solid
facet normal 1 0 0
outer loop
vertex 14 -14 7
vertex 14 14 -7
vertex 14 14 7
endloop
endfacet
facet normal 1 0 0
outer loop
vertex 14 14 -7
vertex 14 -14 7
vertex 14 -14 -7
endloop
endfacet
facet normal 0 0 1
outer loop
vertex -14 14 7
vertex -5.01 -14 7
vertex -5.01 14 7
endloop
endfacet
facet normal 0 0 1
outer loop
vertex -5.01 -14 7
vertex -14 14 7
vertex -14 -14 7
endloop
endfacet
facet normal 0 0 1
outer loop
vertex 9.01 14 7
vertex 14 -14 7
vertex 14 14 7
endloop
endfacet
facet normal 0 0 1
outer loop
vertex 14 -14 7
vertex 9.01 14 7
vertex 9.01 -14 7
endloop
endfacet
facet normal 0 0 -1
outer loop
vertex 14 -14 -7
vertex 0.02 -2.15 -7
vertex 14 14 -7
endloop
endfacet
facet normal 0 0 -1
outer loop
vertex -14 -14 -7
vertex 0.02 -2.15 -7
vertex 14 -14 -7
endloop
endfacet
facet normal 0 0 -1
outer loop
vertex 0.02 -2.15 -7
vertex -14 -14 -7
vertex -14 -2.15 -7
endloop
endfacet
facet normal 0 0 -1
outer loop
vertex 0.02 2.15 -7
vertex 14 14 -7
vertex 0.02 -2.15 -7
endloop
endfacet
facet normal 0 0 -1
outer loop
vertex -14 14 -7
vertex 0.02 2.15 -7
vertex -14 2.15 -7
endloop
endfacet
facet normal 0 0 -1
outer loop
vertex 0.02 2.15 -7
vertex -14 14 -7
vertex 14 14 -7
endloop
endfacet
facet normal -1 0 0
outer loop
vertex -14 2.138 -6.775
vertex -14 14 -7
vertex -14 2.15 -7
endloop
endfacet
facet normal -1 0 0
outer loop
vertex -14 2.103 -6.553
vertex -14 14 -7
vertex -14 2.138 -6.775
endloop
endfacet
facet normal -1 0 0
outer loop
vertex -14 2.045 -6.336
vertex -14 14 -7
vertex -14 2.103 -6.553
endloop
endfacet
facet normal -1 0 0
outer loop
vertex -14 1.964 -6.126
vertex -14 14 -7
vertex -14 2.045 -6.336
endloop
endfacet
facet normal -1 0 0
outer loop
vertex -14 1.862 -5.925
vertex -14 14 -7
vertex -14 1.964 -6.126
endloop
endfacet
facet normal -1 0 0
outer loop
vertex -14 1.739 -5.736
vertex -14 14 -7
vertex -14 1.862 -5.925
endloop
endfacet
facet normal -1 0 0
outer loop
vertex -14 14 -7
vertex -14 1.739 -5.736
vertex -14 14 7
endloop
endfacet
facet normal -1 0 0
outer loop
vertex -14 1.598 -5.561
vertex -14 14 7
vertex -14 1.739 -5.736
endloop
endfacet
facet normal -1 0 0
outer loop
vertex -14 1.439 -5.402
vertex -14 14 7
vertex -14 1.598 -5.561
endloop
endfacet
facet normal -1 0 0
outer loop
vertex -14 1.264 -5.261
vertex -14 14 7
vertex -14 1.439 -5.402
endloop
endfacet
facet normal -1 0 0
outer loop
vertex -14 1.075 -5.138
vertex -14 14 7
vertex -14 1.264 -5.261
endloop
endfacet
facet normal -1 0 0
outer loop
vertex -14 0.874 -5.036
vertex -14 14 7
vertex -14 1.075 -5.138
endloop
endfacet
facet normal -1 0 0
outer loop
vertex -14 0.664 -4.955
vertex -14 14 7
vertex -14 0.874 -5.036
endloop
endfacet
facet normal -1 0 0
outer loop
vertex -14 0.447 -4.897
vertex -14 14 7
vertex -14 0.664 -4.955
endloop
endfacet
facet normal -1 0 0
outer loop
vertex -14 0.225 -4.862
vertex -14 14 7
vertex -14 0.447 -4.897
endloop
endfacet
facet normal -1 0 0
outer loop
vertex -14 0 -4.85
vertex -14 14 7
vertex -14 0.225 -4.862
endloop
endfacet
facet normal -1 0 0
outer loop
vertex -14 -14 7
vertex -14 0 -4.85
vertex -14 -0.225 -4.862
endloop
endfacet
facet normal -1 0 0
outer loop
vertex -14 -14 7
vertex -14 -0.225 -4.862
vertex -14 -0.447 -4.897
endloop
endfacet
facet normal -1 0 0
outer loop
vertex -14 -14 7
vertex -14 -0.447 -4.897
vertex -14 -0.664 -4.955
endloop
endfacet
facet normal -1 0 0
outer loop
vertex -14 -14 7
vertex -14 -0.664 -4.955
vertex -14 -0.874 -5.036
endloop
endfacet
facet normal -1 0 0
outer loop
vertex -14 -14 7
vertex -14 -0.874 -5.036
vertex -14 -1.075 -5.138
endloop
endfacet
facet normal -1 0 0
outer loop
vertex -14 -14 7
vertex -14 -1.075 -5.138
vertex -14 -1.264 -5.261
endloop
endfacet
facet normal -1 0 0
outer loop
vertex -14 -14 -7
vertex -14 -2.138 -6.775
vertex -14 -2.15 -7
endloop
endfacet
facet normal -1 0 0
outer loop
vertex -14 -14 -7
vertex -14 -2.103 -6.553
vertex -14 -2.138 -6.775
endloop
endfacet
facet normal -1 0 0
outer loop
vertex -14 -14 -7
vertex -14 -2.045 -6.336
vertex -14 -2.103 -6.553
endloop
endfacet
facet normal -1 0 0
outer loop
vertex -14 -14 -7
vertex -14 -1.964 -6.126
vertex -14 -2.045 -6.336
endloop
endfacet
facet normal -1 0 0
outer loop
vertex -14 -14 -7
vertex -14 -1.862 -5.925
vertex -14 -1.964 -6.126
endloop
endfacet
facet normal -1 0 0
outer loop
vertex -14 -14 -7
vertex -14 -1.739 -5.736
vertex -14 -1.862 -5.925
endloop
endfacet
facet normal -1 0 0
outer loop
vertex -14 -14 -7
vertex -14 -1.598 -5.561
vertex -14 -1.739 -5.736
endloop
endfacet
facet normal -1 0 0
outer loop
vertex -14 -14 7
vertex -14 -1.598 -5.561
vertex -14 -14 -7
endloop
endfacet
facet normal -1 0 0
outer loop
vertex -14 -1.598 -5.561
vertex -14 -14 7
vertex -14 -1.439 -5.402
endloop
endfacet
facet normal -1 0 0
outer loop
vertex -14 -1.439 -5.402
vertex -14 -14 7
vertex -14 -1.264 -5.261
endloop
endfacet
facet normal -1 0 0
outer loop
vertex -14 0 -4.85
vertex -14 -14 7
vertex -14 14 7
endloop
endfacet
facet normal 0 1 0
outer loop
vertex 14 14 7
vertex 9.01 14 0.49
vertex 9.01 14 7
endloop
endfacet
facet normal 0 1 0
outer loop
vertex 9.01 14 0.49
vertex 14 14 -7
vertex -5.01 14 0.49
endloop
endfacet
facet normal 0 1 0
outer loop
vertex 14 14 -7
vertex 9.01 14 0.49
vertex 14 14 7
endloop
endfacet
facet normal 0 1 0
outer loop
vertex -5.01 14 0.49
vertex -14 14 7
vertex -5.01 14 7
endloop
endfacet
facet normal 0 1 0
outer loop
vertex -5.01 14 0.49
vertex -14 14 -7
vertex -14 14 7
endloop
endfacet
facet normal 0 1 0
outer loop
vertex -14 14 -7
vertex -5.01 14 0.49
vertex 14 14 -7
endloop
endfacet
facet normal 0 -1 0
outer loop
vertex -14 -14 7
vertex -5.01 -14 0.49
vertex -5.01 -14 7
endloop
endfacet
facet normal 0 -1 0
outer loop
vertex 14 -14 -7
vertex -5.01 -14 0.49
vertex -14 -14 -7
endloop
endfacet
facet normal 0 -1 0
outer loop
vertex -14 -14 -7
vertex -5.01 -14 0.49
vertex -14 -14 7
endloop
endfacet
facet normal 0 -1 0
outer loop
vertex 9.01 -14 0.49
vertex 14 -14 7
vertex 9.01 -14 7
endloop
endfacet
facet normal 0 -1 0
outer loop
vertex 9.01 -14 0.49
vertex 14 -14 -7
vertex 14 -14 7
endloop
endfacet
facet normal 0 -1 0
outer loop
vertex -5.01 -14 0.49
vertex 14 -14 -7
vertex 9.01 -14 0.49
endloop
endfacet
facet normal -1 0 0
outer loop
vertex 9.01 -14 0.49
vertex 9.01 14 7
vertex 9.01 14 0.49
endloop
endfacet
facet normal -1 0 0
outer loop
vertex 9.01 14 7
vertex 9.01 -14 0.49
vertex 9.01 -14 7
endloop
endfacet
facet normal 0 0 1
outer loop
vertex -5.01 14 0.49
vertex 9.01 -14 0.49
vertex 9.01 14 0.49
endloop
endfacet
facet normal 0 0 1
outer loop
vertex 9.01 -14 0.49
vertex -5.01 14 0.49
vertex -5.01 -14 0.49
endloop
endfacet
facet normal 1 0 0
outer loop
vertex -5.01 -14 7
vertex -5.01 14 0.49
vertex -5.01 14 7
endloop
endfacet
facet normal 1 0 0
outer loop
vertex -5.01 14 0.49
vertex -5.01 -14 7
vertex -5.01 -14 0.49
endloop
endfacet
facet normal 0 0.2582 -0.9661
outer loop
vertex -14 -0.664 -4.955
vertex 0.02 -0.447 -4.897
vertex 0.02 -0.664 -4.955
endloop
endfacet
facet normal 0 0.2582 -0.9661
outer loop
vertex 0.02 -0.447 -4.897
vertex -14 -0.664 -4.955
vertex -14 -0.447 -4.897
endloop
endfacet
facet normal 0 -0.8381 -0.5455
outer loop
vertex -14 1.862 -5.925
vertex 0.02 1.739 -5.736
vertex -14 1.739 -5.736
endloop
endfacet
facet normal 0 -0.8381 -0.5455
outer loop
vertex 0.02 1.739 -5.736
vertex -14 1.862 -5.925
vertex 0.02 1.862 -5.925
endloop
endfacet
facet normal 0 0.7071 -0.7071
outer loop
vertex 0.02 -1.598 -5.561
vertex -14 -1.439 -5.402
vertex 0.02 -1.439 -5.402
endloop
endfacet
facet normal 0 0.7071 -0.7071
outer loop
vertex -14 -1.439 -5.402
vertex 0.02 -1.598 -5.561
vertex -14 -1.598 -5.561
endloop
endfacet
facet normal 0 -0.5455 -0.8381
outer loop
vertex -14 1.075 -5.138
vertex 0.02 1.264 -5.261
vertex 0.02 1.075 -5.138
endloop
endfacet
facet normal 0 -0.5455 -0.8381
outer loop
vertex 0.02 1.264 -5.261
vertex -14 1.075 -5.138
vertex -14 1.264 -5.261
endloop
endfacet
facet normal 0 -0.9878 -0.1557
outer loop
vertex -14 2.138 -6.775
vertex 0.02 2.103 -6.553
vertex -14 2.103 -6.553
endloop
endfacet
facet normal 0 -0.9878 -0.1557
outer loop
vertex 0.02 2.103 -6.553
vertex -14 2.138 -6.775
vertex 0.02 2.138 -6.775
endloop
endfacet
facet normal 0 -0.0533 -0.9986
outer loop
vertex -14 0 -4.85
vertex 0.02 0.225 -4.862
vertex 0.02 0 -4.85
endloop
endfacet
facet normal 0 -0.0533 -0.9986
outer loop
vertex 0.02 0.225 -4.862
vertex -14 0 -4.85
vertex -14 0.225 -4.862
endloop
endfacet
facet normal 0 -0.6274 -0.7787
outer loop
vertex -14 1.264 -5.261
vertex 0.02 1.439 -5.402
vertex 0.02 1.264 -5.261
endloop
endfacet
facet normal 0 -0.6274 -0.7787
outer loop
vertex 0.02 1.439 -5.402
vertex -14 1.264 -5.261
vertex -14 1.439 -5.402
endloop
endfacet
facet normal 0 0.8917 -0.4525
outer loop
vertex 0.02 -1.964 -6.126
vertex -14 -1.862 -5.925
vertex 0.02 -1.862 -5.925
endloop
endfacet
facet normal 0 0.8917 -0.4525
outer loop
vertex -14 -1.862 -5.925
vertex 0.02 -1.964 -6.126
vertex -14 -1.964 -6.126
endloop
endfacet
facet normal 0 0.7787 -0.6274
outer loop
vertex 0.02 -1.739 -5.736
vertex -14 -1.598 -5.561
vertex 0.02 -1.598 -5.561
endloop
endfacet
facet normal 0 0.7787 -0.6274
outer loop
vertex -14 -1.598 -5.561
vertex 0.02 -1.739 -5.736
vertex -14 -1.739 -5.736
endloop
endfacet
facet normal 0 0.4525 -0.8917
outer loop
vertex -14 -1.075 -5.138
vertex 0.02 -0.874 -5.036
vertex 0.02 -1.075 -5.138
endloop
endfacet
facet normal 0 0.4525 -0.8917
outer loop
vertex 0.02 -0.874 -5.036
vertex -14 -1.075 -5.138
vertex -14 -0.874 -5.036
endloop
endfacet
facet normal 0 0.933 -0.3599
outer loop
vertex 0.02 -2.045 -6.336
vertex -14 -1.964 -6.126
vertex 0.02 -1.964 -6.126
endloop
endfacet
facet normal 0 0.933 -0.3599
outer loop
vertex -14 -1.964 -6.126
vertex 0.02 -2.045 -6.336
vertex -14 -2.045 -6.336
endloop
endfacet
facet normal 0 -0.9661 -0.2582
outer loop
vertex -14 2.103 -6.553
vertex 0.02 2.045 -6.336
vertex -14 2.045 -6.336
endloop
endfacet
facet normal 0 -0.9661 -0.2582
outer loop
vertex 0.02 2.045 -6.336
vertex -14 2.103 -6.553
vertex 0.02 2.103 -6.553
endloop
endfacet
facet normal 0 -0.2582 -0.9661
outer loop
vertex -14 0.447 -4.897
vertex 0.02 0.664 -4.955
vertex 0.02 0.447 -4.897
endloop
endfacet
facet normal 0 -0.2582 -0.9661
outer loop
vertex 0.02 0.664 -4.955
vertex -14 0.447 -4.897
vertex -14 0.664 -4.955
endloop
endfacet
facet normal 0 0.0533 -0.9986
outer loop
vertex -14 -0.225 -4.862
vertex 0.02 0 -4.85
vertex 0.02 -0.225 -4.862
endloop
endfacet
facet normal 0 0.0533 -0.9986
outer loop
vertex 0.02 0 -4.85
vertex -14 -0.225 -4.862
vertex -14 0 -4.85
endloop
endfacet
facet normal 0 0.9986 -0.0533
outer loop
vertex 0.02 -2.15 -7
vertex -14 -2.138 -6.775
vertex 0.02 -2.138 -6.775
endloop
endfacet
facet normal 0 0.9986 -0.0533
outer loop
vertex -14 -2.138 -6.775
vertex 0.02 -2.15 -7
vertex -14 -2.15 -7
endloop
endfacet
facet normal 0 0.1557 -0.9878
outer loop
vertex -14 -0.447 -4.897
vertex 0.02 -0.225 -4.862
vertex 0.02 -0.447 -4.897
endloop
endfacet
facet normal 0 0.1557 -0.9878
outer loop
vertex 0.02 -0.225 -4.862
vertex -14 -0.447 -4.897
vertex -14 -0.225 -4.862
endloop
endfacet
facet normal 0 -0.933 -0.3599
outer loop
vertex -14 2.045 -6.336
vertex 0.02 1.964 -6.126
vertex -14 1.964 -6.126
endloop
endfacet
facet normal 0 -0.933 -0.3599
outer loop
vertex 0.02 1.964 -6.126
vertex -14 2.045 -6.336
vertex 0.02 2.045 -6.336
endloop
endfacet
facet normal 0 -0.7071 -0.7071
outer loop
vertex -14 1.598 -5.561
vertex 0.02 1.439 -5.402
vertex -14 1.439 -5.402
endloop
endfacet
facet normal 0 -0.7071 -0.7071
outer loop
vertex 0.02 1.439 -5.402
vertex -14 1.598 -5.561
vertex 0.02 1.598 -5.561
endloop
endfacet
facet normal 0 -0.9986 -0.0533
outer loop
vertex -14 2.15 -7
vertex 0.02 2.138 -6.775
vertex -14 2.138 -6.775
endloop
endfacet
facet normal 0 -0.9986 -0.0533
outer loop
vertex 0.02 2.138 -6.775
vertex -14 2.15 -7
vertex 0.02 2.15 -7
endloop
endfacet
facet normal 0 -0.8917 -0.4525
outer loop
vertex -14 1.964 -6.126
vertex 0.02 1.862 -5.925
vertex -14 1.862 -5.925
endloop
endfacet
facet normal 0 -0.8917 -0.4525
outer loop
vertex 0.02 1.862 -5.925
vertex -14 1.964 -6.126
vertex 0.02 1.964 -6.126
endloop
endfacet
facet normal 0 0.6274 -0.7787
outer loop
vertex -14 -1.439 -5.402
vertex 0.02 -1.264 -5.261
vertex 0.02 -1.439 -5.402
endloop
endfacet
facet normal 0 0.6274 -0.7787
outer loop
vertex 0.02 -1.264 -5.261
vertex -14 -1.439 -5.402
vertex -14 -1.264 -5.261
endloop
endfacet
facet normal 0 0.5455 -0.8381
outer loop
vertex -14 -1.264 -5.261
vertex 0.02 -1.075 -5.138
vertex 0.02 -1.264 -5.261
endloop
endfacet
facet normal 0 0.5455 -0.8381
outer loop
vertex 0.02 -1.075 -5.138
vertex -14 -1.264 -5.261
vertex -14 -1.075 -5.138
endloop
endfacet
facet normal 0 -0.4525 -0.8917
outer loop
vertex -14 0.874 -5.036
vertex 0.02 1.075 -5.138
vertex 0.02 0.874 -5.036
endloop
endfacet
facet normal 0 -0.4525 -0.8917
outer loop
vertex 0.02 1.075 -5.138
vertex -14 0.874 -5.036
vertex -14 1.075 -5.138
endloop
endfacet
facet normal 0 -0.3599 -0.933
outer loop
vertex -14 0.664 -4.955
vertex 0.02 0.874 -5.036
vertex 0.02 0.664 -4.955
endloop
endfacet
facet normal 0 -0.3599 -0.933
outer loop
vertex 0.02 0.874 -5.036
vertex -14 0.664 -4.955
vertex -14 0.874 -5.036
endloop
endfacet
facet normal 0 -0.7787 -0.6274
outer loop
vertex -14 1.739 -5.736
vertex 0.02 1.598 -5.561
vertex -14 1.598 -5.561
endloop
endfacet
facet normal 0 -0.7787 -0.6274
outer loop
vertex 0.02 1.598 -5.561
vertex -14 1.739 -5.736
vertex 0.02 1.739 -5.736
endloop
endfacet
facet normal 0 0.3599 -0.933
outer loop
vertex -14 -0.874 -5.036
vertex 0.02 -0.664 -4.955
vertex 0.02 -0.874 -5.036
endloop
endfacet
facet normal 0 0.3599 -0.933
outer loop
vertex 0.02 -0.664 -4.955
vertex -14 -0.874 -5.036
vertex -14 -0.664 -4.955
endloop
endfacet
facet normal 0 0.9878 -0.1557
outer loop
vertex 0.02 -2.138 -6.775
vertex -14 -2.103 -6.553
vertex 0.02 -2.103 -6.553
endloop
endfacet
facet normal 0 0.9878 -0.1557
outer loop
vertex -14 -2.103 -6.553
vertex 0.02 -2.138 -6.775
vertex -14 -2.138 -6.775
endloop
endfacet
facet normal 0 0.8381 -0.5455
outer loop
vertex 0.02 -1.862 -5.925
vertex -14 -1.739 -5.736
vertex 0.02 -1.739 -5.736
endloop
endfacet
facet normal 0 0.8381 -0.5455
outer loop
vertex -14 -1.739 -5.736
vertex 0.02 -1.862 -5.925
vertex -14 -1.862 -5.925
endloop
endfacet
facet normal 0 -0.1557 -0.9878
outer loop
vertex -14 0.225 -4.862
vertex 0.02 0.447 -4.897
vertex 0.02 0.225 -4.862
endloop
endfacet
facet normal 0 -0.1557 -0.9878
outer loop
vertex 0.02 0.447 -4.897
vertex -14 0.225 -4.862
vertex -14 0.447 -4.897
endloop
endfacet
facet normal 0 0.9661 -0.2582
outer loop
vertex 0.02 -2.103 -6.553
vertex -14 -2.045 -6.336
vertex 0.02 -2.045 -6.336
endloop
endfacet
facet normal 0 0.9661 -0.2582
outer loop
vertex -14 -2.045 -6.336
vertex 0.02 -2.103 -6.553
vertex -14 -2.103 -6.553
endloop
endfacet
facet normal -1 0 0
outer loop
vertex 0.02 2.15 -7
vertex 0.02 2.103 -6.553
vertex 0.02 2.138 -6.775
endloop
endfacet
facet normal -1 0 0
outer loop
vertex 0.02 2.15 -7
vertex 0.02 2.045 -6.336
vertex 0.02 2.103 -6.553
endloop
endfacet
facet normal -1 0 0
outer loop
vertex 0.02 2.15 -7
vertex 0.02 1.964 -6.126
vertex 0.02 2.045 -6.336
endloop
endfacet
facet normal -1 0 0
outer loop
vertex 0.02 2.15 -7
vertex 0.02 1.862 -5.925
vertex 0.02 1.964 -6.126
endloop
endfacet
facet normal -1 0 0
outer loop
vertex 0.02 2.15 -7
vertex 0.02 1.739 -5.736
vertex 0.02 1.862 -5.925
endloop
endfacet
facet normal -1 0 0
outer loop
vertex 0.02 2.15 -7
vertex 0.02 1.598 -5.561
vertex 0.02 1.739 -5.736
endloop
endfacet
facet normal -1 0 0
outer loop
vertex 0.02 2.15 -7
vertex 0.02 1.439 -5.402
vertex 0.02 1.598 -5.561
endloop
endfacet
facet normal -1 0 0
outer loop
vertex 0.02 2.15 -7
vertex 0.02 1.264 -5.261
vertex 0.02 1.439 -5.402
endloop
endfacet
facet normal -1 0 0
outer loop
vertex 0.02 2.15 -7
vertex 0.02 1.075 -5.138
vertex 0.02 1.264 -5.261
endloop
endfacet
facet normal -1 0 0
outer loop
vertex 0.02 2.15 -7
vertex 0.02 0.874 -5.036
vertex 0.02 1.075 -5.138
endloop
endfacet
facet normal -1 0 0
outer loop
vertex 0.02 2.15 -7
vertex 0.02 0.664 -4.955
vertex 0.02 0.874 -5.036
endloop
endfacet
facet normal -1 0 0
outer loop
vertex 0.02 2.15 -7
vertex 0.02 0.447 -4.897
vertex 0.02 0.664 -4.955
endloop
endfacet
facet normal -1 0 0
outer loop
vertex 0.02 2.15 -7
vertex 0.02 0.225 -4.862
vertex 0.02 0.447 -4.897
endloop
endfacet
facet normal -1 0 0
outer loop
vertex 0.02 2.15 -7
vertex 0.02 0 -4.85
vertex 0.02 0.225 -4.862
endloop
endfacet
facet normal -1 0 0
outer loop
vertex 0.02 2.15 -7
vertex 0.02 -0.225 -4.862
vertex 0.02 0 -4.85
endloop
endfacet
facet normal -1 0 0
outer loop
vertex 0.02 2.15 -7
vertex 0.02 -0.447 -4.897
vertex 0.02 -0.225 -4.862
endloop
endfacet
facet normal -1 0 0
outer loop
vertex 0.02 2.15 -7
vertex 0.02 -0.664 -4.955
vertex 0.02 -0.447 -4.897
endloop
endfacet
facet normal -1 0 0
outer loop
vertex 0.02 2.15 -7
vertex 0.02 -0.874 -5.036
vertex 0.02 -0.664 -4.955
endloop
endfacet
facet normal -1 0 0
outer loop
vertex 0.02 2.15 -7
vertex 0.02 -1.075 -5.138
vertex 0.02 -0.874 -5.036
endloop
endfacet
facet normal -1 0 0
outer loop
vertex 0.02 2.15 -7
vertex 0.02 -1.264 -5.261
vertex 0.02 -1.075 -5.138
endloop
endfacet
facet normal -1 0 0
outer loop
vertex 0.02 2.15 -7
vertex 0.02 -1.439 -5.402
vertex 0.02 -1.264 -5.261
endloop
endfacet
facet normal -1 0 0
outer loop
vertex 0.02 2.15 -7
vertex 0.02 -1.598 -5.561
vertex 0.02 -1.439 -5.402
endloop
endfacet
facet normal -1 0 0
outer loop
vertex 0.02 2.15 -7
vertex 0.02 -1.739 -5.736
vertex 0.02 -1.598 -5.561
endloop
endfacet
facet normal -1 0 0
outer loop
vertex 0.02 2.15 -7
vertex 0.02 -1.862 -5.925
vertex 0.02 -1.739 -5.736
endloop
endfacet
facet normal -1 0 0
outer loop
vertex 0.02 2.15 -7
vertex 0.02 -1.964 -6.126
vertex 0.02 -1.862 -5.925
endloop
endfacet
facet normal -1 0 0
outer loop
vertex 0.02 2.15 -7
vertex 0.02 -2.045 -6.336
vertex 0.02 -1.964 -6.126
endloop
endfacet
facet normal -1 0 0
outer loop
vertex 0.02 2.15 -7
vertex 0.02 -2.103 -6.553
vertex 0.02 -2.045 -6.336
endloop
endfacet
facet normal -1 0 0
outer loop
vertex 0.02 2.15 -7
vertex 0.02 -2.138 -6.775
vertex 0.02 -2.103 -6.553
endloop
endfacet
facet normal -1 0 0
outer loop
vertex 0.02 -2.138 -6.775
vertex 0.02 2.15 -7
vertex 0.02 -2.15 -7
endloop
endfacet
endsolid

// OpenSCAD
// Snap panel clip with a U-shaped panel slot.
$fn = 60;
eps = 0.02;
panel_t = 6;
clip_w = 28;
clip_l = 28;
clip_h = panel_t + 8;
slot = panel_t + 0.5;
difference() {
    cube([clip_l,clip_w,clip_h],center=true);
    translate([2,0,clip_h/2-slot/2]) cube([clip_l/2+eps,clip_w+2*eps,slot+eps],center=true);
    translate([-clip_l/2-eps,0,-clip_h/2]) rotate([0,90,0]) cylinder(d=4.3,h=clip_l/2+2*eps);
}
